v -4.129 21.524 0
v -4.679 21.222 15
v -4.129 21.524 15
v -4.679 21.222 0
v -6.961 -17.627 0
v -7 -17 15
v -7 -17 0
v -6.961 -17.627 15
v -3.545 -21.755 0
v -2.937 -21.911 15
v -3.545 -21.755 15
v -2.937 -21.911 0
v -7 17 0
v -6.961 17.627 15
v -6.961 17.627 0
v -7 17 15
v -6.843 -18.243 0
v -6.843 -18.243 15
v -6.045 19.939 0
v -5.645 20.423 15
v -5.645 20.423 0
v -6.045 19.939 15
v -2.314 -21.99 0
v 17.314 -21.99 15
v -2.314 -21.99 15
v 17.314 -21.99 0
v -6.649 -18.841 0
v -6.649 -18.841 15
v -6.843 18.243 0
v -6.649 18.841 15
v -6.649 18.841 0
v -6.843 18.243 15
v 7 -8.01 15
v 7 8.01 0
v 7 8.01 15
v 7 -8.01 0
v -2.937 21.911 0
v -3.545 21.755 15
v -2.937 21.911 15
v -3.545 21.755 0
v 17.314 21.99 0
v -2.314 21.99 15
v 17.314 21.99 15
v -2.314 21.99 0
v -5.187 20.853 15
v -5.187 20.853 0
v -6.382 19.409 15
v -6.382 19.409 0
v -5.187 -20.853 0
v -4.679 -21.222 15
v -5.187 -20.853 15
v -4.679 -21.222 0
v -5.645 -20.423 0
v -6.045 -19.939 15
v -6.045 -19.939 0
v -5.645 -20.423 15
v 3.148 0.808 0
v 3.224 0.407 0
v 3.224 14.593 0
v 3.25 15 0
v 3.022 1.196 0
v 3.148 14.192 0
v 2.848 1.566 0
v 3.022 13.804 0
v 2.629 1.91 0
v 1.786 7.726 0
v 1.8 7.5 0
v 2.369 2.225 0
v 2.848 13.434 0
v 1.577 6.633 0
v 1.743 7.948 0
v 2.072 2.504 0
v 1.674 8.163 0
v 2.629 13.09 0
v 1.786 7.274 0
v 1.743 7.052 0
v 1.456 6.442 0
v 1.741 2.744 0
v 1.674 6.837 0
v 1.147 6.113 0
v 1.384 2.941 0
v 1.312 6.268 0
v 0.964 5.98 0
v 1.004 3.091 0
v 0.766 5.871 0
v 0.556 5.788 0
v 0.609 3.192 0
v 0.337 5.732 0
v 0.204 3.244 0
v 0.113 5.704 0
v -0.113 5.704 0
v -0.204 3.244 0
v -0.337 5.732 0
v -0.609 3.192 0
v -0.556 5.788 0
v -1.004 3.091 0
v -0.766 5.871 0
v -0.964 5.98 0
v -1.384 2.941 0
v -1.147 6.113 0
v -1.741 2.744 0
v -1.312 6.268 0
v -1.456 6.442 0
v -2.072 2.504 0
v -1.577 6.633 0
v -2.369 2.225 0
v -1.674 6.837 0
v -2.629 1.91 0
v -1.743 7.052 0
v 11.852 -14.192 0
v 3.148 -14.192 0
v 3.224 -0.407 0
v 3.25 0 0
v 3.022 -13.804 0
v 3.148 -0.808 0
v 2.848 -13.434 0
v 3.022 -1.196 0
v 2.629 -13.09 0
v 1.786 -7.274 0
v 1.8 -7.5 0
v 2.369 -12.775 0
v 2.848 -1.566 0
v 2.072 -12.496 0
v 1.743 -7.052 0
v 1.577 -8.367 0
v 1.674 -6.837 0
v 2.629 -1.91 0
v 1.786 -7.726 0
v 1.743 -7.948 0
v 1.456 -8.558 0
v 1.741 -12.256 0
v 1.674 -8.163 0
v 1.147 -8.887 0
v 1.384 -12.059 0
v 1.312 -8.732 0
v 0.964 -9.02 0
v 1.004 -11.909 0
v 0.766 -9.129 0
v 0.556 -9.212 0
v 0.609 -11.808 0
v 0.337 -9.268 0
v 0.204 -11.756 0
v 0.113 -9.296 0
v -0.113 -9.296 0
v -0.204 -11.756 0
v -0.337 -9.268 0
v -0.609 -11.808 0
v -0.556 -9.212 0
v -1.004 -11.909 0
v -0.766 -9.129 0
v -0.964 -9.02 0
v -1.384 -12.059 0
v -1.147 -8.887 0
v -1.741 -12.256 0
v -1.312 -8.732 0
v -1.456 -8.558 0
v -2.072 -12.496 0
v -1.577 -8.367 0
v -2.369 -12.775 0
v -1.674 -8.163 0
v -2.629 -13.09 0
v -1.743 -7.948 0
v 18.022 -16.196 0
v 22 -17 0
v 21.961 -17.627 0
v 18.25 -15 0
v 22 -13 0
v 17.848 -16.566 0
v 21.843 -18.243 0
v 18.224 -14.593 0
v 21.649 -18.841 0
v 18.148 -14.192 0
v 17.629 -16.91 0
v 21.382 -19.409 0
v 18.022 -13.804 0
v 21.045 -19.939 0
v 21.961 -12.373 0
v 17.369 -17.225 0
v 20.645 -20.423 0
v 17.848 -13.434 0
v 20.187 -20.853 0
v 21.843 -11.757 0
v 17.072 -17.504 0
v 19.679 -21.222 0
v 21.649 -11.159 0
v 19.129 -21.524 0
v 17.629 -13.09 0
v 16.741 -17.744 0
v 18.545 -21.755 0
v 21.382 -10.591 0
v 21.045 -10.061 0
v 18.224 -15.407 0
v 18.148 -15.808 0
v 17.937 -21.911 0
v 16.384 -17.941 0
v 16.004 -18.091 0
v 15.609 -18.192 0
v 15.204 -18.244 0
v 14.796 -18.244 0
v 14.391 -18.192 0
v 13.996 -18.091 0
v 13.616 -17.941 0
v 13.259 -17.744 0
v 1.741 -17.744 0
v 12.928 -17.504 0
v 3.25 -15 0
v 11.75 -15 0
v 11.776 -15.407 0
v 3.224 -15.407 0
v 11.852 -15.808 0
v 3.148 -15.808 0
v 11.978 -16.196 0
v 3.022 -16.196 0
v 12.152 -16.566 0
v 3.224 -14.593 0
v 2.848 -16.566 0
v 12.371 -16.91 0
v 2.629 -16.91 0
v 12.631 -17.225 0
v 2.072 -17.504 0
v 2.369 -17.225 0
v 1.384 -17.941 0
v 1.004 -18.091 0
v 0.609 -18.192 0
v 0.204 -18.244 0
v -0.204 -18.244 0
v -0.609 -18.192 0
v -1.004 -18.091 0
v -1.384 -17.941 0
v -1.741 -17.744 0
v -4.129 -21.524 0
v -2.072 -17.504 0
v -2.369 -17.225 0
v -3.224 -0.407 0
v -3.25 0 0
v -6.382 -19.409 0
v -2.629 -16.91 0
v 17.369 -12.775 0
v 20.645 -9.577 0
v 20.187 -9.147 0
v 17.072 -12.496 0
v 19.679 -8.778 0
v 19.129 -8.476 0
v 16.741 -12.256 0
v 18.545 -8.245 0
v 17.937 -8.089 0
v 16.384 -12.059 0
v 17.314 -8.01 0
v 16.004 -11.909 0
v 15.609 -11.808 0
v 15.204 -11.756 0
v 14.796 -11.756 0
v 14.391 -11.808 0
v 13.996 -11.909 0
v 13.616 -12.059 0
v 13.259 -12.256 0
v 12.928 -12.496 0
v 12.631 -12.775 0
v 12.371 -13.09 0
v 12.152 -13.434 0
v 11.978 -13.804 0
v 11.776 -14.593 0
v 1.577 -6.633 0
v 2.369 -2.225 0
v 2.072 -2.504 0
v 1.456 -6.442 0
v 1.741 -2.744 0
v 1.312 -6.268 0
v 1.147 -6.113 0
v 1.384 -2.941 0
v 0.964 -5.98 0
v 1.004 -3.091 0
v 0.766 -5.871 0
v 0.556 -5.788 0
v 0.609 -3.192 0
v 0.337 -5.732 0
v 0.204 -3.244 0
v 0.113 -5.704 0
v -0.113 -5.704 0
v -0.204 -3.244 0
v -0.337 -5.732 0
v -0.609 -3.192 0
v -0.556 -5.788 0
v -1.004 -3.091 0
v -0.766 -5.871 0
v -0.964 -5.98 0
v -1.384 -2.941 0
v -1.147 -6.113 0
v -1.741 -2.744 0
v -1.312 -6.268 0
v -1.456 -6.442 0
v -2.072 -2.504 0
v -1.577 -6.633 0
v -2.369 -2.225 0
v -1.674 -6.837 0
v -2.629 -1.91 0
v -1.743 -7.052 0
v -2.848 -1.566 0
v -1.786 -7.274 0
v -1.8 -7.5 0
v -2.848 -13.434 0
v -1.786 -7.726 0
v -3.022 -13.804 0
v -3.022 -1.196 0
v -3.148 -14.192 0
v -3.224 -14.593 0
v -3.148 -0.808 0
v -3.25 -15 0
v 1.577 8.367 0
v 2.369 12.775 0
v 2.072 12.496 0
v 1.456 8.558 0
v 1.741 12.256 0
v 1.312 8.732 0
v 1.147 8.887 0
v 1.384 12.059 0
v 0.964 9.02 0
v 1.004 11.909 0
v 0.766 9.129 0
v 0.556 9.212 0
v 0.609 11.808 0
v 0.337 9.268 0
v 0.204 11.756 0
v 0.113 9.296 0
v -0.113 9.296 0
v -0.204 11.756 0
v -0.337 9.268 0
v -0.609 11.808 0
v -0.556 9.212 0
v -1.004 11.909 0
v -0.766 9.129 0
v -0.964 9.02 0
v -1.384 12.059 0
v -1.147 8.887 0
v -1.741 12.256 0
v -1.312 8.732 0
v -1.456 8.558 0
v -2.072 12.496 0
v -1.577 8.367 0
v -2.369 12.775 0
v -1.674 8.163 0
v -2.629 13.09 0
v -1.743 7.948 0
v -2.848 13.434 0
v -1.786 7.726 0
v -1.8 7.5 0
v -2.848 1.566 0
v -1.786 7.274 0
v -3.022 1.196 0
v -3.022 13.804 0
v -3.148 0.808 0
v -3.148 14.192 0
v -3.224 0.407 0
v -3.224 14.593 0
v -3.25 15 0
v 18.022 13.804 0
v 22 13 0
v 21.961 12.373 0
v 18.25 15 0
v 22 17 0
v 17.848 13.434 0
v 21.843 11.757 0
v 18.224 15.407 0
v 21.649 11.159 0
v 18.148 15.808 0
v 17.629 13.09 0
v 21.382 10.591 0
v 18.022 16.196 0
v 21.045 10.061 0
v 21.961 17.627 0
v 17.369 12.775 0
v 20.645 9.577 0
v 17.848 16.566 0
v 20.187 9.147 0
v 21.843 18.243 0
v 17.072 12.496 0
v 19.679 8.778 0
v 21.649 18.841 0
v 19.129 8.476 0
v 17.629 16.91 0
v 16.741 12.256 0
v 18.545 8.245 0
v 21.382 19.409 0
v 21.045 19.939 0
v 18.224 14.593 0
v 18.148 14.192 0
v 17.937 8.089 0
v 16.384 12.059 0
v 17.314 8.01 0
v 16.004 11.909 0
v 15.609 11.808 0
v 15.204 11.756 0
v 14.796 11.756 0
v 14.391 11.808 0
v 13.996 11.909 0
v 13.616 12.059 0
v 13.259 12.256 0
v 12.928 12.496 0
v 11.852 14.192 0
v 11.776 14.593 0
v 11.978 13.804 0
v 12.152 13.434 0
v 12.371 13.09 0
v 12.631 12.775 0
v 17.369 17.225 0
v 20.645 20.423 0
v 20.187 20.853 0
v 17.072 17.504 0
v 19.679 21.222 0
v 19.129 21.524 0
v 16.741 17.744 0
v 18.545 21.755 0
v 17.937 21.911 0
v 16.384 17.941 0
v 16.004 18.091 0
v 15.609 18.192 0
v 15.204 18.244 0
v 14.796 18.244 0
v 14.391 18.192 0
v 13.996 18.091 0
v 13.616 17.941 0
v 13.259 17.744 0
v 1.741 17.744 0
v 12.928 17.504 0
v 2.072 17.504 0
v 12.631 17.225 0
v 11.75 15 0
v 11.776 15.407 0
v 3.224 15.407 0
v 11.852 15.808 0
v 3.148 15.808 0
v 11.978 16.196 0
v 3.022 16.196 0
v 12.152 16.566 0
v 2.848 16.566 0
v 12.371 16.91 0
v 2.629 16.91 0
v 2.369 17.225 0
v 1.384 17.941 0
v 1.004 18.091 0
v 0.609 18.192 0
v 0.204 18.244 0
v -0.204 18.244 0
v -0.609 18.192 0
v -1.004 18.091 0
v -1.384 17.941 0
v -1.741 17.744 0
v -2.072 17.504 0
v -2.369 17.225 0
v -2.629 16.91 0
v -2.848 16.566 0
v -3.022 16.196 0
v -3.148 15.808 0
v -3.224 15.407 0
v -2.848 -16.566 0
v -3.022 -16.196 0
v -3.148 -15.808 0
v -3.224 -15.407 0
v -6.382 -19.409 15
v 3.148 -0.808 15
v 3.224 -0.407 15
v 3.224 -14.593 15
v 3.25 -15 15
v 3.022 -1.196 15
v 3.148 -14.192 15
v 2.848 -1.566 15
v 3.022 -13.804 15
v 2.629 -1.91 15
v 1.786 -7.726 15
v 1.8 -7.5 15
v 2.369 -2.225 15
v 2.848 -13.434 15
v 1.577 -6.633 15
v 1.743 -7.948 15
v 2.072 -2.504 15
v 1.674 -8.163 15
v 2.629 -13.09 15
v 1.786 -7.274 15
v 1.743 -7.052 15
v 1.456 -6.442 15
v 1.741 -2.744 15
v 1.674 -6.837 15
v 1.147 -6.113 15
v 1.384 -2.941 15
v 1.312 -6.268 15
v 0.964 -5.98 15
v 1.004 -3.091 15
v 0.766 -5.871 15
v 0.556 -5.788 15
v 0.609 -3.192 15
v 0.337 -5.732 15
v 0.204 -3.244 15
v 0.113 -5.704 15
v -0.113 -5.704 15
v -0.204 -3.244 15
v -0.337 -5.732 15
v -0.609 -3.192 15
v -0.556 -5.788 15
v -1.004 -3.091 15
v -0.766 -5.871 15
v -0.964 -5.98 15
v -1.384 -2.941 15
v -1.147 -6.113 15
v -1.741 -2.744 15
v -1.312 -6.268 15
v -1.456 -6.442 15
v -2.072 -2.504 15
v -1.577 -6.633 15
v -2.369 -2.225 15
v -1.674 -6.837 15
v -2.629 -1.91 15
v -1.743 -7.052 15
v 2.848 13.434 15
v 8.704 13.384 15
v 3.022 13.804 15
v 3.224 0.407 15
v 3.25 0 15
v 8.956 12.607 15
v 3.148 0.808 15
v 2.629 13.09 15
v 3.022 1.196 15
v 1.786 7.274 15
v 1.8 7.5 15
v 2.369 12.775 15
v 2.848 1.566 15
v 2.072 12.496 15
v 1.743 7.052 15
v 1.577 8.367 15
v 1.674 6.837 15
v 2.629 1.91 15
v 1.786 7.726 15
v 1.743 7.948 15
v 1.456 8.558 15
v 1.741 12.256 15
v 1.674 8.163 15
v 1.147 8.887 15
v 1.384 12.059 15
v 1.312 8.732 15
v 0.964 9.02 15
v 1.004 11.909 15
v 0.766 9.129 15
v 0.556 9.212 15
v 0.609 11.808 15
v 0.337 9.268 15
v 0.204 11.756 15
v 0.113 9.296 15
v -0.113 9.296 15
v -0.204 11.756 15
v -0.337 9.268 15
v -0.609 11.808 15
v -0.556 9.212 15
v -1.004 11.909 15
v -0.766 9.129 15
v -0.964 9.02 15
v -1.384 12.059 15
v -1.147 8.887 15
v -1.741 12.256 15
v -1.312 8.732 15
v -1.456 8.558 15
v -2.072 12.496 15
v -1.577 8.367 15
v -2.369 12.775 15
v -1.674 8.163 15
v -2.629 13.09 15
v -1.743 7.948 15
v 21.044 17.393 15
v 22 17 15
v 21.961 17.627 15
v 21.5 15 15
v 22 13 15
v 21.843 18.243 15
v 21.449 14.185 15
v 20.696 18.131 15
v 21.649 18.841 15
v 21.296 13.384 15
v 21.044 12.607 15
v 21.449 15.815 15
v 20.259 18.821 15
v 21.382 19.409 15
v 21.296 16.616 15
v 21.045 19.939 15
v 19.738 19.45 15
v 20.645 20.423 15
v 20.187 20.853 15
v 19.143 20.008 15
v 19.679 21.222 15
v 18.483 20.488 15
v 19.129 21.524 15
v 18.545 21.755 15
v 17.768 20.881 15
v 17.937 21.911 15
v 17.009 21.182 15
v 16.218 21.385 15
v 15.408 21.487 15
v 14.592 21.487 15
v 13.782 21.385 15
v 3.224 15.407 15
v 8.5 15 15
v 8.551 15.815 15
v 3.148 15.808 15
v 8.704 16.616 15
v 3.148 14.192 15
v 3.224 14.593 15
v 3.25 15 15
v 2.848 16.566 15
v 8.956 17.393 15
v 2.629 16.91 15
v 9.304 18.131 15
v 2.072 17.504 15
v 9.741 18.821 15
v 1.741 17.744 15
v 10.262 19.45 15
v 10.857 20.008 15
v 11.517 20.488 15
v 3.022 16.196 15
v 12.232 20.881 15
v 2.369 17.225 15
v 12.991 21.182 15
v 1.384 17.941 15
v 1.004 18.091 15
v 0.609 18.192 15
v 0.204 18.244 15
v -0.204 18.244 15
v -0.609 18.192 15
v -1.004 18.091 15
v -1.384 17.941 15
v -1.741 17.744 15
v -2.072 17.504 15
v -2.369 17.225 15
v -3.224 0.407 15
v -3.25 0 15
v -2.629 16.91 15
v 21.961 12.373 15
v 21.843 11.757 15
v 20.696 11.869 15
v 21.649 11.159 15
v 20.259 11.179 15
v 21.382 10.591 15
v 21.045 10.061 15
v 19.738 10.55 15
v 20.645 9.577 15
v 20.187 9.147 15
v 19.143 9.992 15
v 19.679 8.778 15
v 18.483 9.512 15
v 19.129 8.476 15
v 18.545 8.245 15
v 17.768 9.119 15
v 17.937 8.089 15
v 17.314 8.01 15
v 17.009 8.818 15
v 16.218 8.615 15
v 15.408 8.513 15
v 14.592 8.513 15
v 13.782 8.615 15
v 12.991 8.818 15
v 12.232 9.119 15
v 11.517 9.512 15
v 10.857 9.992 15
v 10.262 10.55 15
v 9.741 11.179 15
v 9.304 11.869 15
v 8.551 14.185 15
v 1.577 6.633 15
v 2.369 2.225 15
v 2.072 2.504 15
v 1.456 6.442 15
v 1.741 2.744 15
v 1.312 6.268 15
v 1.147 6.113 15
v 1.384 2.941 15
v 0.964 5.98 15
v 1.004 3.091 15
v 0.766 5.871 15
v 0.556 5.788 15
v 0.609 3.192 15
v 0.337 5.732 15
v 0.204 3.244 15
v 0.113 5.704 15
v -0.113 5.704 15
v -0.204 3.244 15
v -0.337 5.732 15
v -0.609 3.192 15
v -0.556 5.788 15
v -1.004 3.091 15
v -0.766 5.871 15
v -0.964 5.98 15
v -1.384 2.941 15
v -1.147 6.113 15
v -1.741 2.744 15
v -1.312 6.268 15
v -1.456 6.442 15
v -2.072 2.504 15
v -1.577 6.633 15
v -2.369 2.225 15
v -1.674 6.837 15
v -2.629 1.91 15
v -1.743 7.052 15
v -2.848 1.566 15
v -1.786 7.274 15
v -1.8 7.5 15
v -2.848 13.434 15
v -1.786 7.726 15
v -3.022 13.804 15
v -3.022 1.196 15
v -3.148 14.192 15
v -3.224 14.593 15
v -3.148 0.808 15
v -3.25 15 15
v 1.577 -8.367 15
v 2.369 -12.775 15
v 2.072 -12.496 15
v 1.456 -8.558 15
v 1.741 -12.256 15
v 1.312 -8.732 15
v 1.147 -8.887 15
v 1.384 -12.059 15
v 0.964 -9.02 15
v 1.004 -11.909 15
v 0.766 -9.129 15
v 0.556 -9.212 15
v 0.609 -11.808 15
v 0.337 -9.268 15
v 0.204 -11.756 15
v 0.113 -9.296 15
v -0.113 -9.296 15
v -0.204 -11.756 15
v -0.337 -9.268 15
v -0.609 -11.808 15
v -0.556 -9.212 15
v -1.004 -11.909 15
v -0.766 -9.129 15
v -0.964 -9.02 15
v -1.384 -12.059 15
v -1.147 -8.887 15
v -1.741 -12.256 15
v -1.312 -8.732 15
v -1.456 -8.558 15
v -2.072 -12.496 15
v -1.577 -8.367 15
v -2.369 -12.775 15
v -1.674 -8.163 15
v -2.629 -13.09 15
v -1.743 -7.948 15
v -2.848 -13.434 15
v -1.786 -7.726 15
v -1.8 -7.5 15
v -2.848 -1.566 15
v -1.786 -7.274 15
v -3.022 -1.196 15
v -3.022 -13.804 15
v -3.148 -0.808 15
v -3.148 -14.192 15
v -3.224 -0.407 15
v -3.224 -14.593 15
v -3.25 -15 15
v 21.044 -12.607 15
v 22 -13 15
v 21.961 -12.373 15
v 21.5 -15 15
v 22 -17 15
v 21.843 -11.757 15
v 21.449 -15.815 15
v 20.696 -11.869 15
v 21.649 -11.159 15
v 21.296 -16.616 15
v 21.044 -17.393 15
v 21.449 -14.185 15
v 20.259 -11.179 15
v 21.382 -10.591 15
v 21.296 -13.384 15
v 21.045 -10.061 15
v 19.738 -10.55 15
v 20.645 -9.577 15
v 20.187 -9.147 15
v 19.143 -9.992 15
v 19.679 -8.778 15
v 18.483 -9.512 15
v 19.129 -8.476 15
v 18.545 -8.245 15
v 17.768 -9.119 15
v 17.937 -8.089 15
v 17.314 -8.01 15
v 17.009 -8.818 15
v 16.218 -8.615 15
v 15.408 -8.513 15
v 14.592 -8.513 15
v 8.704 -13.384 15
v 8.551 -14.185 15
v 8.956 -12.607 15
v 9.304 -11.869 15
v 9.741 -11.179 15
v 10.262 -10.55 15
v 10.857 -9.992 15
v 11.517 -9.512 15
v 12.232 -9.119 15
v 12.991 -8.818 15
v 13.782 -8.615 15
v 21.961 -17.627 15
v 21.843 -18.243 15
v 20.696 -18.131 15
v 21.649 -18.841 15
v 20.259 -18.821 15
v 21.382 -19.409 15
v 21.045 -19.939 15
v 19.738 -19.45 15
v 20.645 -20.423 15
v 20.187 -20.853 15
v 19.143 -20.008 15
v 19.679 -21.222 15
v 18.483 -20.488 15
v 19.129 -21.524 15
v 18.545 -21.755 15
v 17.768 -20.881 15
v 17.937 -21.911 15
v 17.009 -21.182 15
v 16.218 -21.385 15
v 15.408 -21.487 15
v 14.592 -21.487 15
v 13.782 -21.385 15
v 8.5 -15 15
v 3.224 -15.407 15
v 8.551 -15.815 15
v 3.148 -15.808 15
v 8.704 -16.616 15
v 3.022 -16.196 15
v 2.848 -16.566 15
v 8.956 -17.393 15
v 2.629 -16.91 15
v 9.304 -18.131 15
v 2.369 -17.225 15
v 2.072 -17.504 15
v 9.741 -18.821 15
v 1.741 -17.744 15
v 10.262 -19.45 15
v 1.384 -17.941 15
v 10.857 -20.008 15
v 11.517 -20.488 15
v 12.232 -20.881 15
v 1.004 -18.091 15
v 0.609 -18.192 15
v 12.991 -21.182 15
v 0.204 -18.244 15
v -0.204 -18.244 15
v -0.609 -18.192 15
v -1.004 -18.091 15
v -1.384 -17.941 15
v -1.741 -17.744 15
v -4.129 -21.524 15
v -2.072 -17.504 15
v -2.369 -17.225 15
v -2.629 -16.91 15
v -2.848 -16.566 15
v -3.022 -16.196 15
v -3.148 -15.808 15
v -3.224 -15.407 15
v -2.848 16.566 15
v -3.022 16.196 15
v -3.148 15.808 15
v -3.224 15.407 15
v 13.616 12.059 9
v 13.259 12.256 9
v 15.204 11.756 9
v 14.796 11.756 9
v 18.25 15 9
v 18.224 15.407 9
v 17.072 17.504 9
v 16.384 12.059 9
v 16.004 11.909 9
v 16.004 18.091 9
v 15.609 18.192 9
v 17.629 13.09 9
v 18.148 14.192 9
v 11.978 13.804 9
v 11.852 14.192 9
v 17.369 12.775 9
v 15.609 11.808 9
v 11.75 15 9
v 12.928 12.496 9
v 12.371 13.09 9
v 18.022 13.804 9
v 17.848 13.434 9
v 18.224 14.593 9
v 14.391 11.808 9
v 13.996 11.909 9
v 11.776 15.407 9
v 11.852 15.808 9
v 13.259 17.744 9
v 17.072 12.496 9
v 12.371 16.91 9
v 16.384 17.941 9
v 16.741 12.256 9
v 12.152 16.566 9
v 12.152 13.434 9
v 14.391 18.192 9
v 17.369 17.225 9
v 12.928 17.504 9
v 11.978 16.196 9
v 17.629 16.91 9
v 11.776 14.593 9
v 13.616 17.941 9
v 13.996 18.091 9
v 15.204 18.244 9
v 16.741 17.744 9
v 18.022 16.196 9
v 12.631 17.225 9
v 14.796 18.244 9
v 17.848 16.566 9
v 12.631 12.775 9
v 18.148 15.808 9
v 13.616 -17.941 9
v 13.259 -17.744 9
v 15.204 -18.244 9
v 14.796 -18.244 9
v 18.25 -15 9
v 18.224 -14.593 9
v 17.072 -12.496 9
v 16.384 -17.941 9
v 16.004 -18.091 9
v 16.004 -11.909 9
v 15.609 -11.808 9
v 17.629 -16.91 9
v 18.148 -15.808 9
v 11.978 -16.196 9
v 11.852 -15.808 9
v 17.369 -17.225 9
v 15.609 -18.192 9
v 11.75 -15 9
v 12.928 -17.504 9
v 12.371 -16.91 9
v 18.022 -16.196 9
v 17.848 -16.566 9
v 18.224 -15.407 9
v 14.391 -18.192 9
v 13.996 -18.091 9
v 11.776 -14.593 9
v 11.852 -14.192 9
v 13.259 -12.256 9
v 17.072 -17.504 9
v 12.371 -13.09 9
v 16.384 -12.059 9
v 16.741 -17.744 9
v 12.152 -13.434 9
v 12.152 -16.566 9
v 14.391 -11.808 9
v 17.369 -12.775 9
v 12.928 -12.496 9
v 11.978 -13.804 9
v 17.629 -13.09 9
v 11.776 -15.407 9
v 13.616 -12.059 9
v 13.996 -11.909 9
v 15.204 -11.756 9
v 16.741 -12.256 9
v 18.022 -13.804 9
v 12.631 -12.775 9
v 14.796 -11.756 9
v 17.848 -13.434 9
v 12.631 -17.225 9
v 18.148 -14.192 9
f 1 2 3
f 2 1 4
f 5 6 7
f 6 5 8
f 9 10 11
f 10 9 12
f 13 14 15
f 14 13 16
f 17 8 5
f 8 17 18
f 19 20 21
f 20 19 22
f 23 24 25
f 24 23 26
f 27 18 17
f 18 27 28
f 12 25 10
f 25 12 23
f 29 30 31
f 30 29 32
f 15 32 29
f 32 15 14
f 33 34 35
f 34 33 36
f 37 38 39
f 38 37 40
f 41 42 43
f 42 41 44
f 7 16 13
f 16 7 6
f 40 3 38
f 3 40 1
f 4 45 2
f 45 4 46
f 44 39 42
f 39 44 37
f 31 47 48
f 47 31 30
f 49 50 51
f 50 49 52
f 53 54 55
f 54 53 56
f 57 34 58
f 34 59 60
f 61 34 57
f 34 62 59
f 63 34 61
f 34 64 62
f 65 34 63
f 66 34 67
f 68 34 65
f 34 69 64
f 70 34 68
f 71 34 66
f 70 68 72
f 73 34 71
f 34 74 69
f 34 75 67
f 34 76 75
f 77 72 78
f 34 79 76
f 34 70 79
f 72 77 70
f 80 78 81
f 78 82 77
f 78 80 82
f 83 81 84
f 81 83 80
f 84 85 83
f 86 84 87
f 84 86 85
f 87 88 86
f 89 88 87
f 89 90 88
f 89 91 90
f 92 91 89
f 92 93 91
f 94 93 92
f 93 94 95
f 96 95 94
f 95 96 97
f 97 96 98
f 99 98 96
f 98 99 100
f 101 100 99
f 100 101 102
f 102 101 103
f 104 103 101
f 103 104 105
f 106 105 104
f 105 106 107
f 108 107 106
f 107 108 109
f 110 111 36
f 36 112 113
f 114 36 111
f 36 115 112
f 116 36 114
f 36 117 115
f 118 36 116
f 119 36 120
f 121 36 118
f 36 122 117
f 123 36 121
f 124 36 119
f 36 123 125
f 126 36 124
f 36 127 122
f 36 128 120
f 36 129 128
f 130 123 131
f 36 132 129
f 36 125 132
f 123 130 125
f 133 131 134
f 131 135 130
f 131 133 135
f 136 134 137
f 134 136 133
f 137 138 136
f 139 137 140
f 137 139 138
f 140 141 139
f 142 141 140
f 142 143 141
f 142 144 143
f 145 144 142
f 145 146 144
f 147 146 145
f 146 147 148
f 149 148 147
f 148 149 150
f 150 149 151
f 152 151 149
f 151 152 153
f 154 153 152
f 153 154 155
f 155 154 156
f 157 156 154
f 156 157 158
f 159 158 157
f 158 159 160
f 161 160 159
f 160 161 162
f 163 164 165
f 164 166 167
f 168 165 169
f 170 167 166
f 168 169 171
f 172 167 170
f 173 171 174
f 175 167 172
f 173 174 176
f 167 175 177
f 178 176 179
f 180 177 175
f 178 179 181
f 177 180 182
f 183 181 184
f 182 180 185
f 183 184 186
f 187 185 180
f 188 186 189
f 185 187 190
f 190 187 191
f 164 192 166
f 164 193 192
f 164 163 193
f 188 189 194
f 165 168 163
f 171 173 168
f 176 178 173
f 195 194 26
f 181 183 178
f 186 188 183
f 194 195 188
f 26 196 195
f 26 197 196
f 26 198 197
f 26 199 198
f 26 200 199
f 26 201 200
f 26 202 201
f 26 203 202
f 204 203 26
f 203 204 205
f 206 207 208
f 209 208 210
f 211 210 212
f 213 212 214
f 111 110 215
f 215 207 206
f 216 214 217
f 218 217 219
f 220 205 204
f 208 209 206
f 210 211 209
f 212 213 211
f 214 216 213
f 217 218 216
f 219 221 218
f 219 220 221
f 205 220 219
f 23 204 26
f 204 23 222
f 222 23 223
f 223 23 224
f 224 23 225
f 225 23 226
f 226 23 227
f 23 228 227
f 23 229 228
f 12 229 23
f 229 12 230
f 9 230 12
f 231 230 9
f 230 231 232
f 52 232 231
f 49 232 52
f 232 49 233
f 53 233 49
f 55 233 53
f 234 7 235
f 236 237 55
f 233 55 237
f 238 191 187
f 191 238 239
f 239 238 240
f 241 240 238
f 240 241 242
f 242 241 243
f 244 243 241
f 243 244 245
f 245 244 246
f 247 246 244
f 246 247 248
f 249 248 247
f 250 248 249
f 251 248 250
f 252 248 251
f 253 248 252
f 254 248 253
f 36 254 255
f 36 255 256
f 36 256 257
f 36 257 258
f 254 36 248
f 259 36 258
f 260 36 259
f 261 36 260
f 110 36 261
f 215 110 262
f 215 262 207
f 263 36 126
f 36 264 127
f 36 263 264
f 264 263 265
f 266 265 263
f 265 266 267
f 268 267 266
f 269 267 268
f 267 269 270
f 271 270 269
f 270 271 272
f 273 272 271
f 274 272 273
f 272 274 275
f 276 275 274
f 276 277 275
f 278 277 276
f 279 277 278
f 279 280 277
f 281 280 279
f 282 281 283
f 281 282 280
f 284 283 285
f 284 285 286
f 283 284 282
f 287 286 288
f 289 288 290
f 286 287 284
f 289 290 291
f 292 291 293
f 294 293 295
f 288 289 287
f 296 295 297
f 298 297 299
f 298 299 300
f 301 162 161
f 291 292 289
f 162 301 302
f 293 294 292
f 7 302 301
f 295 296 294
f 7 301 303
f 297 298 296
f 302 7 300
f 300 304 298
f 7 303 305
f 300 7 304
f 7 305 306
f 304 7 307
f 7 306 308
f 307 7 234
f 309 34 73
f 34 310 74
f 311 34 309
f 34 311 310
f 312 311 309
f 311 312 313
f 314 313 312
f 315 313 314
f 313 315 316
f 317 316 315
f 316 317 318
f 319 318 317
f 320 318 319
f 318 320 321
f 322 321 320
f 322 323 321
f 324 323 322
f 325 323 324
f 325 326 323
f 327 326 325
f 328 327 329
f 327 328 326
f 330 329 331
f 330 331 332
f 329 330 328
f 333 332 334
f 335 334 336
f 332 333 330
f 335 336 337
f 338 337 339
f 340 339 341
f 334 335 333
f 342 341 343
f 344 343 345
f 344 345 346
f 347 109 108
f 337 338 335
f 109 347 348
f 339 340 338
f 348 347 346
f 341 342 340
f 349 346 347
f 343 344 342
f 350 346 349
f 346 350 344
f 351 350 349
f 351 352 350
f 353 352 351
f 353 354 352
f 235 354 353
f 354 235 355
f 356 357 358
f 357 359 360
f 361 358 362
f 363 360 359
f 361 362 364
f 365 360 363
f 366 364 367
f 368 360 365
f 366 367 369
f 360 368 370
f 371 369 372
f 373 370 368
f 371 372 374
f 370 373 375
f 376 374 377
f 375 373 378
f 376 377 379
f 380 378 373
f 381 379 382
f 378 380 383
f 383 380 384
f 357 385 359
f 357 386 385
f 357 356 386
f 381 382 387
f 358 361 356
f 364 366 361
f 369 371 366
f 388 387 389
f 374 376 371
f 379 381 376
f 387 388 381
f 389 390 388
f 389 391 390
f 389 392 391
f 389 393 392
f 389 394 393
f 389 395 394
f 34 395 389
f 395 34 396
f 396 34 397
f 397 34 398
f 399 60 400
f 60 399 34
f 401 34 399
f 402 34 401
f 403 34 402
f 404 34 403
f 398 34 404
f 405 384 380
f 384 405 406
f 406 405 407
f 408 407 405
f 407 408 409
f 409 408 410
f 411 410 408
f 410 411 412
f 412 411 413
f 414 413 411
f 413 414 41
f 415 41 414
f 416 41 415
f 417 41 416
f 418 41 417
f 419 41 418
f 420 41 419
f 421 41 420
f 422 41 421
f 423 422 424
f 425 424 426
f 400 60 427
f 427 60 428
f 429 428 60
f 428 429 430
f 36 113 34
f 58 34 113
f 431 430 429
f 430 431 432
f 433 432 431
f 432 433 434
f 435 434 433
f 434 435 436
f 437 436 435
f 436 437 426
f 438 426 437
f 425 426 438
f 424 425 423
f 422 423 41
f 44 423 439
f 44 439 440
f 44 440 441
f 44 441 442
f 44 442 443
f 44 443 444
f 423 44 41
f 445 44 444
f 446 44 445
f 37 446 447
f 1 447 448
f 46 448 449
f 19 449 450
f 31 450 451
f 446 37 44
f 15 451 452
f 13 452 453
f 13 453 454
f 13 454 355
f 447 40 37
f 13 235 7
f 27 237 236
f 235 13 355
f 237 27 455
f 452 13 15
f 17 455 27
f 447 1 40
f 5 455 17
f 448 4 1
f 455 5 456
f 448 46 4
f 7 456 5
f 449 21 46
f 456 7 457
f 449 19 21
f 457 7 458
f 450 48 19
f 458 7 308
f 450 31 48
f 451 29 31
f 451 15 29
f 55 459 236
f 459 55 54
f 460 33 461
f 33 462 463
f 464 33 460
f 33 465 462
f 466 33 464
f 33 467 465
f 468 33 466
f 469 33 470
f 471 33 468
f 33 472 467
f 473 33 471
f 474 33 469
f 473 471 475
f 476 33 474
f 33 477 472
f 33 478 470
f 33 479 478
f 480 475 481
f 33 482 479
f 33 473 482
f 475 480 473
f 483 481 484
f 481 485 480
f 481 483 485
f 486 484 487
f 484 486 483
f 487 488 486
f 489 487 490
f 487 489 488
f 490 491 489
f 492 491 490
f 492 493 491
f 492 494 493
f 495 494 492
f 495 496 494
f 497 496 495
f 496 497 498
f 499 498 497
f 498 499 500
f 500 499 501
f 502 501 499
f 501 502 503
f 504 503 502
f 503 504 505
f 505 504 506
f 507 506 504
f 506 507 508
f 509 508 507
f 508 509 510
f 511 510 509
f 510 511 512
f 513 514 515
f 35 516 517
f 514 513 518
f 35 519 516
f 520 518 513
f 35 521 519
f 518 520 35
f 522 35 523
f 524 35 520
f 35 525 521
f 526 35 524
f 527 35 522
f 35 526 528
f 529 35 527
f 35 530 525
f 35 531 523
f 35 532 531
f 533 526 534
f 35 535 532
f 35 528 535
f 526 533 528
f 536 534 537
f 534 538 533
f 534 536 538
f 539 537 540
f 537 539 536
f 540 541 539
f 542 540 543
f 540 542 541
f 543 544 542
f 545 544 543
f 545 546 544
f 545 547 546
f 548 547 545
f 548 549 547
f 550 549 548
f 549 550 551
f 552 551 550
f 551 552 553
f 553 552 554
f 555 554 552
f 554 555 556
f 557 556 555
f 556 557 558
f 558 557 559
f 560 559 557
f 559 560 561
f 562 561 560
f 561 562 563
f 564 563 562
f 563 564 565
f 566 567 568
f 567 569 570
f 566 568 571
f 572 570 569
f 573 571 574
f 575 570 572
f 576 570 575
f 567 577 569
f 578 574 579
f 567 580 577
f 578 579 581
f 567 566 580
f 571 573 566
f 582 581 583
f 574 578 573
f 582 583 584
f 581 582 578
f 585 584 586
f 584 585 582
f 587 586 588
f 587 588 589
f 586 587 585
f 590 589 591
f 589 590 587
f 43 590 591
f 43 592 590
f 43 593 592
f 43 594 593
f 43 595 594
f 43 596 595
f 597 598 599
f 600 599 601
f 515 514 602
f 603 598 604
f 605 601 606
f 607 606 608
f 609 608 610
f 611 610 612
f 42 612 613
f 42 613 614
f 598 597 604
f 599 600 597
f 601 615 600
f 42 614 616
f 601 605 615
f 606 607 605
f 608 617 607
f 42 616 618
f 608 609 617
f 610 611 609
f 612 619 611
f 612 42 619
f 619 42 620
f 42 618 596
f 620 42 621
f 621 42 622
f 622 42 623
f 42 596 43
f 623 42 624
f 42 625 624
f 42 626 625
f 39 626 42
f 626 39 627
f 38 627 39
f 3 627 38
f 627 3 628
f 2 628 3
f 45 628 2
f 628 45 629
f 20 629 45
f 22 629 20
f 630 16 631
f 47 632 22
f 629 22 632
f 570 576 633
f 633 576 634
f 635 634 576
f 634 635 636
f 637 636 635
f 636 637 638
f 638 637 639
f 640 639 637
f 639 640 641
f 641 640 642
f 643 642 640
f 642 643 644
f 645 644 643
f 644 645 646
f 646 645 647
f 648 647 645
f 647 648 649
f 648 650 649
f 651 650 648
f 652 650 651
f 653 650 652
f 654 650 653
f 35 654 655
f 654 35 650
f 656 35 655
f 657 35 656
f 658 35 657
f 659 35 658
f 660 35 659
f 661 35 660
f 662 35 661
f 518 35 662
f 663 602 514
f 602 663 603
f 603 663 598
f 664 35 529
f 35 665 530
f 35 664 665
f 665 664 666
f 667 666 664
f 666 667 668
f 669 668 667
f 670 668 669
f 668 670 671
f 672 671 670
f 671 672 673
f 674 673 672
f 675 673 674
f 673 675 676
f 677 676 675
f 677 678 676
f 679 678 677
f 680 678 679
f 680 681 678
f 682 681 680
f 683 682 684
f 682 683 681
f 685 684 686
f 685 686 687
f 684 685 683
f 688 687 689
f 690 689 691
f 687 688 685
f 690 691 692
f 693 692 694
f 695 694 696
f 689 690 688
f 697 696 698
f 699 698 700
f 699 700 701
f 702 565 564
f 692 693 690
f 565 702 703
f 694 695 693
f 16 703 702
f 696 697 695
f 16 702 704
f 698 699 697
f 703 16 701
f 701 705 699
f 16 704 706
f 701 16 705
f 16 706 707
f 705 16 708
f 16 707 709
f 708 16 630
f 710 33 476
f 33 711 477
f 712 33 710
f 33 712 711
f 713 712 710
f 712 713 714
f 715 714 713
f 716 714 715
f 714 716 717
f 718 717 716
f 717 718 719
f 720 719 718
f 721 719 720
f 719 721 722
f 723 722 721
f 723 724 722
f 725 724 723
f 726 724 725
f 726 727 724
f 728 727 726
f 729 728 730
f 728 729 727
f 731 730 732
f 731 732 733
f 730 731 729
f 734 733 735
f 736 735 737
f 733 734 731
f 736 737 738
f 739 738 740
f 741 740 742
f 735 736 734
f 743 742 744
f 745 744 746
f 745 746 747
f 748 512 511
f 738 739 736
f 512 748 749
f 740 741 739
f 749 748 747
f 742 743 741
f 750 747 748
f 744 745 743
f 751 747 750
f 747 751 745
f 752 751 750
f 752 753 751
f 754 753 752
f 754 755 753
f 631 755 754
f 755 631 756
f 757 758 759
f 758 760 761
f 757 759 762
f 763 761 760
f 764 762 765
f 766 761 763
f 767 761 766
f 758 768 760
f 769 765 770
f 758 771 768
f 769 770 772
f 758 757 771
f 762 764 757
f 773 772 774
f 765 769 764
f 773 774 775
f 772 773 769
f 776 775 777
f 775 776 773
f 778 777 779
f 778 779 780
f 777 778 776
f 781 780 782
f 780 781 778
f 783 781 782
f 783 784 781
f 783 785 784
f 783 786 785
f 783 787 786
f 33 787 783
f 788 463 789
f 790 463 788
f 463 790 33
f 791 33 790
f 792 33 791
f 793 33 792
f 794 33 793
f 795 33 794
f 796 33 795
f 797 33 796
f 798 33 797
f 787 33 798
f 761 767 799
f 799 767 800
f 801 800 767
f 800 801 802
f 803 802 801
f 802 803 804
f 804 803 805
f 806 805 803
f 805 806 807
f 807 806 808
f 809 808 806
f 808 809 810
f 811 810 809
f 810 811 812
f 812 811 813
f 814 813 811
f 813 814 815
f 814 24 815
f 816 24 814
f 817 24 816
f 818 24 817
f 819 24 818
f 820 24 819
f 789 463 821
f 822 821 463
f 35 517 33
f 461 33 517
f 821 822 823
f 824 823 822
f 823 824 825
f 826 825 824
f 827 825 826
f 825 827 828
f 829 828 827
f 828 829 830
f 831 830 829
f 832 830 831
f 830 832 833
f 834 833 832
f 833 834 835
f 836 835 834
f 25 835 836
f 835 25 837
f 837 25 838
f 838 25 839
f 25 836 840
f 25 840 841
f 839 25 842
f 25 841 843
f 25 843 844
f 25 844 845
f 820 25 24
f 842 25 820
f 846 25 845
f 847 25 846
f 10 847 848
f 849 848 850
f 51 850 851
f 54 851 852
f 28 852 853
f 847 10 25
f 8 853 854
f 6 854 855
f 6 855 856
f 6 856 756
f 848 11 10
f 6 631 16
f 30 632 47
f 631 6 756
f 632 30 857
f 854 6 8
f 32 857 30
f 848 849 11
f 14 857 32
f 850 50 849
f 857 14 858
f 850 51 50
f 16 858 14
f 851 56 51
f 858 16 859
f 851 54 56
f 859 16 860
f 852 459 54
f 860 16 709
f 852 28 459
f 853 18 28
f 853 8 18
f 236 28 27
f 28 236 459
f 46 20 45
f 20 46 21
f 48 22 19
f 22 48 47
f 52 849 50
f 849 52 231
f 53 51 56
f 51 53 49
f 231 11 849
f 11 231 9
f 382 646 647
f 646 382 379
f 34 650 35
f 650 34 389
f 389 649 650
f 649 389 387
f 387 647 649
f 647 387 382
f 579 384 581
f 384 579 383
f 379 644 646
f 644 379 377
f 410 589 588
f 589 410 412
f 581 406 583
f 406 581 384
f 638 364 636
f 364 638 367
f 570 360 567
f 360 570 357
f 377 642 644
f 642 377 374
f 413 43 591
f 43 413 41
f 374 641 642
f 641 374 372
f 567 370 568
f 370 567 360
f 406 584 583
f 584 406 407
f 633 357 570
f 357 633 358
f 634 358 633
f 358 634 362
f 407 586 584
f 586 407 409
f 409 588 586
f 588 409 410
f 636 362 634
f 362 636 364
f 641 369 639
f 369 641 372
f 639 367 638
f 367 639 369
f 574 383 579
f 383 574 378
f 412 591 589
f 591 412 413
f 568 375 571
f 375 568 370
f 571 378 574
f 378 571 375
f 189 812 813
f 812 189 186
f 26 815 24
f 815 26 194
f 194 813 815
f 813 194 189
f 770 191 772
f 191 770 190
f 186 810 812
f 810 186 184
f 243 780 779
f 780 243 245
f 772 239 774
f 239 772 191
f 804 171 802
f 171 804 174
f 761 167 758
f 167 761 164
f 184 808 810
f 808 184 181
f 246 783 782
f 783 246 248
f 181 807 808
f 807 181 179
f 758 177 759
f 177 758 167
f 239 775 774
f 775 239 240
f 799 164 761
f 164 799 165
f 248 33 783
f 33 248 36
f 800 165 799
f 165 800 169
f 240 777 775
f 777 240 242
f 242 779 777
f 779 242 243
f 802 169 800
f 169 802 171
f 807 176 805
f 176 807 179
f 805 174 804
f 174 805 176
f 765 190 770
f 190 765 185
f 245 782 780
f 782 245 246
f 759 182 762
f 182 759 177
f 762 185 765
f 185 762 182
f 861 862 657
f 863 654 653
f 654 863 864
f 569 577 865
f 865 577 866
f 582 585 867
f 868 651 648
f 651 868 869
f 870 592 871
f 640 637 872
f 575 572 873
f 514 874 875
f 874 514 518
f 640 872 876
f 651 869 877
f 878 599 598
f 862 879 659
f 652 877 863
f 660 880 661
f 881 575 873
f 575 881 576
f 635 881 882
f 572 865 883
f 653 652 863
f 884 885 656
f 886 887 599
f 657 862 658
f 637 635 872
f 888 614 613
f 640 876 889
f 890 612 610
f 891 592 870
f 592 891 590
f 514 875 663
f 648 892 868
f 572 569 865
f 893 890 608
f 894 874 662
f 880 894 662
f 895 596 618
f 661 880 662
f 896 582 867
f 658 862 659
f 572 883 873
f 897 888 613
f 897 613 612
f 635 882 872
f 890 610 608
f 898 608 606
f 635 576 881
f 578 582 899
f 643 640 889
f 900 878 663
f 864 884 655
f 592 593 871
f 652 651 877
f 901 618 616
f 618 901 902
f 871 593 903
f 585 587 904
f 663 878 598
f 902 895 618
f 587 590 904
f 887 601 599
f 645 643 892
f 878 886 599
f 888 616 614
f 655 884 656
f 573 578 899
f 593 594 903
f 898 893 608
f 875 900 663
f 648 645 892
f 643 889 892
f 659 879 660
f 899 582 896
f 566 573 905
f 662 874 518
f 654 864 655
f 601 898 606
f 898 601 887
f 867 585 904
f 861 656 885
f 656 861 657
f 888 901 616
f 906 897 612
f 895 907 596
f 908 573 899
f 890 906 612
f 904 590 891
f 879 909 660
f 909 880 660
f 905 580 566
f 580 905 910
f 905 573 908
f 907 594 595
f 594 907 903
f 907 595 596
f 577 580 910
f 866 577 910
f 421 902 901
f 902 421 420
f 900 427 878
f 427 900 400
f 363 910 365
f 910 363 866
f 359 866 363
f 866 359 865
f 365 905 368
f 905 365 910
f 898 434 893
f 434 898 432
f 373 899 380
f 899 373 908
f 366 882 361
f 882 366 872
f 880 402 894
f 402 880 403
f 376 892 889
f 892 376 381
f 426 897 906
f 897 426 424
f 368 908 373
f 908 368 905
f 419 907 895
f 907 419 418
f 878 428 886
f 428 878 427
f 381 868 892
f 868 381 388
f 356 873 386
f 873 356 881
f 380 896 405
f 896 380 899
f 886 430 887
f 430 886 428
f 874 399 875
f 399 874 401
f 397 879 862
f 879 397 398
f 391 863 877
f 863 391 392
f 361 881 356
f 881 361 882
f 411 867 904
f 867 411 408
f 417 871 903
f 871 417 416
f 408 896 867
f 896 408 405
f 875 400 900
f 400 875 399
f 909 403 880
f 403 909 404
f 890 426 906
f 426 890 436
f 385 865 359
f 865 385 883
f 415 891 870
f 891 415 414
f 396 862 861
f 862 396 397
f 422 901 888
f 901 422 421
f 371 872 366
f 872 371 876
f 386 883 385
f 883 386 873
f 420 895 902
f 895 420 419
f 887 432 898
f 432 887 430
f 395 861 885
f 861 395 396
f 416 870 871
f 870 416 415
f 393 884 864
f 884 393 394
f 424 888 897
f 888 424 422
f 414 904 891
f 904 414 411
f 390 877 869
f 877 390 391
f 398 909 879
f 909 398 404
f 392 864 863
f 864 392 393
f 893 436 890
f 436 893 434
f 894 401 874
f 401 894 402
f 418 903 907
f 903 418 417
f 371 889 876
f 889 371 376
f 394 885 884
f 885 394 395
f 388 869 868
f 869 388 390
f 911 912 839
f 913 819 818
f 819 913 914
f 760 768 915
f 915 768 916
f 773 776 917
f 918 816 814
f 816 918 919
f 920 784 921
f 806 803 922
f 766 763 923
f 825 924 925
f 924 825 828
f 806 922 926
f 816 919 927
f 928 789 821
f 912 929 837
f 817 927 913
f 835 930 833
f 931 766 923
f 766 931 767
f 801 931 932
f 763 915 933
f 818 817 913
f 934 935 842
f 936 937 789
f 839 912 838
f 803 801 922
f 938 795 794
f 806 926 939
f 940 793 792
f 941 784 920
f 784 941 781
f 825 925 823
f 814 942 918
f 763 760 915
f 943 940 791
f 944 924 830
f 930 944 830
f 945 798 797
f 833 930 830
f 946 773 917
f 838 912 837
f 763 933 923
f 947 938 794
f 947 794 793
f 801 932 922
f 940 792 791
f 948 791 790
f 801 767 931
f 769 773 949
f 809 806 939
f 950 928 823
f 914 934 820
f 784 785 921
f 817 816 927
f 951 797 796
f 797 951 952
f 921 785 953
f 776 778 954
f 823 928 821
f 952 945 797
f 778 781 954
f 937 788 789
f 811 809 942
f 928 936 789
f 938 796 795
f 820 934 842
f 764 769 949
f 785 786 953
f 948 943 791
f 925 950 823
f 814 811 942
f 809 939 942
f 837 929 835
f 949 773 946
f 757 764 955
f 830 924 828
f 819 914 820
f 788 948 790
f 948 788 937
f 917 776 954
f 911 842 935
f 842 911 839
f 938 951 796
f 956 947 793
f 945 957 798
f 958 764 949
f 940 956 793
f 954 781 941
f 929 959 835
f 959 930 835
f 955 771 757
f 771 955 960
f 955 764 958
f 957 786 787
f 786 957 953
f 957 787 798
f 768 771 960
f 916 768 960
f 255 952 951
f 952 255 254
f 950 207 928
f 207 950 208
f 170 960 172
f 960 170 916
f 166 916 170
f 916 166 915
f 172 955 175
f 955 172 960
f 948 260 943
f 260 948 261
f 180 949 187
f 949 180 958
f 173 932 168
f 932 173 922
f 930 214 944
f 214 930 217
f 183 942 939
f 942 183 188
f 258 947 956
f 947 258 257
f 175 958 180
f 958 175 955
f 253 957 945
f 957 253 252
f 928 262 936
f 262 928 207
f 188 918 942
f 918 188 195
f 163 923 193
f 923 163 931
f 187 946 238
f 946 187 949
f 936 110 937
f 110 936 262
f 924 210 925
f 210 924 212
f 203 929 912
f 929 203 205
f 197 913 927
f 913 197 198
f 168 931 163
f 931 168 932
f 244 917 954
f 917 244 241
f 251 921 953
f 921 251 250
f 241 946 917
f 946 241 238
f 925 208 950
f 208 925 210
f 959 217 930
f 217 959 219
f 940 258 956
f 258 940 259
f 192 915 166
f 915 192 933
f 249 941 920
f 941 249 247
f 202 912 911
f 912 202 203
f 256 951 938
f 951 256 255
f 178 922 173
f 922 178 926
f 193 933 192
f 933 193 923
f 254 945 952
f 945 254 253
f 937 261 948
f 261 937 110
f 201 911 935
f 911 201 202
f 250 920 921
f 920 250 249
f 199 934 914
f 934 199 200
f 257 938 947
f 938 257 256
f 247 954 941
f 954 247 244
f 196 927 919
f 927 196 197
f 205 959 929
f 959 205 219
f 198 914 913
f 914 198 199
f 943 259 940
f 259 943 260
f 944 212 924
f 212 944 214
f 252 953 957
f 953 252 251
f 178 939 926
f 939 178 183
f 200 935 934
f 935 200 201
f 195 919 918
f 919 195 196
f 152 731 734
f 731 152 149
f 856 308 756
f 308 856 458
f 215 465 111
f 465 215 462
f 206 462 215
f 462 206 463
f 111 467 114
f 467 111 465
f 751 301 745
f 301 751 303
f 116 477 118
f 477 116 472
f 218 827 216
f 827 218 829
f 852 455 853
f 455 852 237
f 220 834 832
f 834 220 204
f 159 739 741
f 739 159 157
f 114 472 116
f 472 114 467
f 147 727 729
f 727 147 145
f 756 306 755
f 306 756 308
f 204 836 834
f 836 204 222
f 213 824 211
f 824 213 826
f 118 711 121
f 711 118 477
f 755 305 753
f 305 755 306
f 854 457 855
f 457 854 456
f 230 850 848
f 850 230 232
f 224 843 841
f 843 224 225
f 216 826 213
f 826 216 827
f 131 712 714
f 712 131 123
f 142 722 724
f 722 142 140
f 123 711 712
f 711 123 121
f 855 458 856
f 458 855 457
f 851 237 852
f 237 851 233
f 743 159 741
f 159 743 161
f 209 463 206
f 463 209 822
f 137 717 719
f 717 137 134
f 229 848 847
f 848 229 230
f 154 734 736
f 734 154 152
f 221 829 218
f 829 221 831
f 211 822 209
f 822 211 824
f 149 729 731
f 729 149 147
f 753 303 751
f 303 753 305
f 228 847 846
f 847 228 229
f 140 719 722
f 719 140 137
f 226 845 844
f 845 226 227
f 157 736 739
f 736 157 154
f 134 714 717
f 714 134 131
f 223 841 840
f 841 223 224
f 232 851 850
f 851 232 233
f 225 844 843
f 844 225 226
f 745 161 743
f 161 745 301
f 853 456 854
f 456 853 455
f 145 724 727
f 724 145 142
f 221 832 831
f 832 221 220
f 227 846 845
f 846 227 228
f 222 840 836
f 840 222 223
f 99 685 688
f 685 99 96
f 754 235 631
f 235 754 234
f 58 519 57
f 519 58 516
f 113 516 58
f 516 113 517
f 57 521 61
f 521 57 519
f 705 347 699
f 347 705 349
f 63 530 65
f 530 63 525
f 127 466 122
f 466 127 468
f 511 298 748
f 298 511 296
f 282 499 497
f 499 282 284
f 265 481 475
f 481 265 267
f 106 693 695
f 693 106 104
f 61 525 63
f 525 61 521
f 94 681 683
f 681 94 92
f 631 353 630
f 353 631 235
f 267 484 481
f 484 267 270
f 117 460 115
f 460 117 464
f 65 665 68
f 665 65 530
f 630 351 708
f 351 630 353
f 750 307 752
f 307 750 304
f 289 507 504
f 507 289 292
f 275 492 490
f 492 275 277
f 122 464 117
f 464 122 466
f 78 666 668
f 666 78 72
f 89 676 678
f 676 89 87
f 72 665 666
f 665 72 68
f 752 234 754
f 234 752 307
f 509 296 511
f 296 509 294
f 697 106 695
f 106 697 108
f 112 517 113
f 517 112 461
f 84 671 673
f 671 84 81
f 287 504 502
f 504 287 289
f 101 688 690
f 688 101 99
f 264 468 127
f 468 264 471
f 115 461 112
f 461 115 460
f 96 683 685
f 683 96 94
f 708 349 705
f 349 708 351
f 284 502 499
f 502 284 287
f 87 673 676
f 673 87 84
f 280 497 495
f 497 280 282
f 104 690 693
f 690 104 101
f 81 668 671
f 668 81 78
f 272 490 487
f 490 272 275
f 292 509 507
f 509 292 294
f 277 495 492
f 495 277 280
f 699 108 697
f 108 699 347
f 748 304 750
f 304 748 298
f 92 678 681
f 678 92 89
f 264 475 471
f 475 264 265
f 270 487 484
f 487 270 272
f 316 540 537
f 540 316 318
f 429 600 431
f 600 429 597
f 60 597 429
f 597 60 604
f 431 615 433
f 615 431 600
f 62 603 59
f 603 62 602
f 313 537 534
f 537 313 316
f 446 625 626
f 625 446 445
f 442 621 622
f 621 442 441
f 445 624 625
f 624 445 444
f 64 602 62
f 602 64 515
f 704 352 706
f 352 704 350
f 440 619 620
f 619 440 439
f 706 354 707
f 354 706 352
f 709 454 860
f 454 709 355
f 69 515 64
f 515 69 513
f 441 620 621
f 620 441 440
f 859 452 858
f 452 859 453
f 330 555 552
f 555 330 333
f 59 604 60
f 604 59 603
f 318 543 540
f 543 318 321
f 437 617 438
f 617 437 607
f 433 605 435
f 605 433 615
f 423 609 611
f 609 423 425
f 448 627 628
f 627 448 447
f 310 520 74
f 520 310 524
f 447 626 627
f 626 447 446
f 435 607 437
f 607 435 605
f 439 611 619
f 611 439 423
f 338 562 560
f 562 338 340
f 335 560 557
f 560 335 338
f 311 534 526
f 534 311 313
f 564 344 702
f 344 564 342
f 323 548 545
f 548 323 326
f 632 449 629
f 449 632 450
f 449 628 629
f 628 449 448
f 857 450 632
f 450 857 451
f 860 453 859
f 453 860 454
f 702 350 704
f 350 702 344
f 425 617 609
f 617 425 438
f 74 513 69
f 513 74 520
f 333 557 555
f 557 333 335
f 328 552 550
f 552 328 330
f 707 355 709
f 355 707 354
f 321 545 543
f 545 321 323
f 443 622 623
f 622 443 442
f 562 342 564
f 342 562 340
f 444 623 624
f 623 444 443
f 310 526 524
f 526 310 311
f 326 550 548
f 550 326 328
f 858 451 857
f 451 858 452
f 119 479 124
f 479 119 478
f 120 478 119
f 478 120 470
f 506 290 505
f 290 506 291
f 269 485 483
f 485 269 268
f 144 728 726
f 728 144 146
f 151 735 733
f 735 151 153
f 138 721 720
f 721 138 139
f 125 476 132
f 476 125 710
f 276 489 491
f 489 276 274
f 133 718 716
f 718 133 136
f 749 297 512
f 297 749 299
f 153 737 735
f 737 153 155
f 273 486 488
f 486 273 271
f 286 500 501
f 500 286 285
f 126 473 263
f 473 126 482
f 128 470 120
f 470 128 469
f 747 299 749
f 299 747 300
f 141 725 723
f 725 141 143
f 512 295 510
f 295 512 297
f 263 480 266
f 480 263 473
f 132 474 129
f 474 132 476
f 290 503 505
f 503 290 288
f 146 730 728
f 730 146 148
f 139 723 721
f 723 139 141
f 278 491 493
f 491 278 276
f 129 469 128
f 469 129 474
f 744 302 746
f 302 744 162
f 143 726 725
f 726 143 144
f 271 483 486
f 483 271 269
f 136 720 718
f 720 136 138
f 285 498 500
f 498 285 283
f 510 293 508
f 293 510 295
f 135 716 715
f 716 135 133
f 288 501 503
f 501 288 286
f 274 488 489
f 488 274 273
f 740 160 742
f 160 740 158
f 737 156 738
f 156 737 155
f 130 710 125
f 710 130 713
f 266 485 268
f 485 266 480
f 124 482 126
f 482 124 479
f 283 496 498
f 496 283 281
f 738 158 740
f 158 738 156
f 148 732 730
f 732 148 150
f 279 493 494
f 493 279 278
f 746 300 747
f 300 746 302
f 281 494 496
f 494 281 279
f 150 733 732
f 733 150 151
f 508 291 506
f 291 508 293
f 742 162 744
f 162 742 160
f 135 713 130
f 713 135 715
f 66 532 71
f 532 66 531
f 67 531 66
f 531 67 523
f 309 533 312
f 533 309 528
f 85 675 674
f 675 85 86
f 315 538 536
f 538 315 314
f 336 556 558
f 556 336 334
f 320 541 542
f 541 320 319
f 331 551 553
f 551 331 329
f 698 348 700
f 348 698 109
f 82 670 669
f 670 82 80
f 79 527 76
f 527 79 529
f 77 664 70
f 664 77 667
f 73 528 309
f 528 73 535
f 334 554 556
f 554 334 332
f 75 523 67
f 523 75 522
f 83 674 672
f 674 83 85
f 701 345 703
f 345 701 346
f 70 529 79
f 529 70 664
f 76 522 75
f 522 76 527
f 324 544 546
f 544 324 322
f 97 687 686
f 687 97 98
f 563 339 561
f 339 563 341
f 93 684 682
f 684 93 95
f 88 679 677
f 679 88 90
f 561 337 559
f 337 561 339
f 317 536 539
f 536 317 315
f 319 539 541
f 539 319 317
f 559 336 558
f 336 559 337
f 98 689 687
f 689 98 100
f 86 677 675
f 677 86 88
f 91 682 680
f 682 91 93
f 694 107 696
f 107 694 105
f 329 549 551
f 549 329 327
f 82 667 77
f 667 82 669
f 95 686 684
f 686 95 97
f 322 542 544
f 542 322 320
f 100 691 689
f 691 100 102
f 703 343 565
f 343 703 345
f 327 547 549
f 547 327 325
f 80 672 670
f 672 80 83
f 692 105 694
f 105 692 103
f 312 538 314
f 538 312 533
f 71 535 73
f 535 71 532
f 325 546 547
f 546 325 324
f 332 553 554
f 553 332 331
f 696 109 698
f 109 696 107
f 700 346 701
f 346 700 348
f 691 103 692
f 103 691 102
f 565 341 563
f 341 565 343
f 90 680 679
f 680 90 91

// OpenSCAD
$fn = 50;


difference() {
	union() {
		hull() {
			translate(v = [-2.0000000000, 17.0000000000, 0]) {
				cylinder(h = 15, r = 5);
			}
			translate(v = [2.0000000000, 17.0000000000, 0]) {
				cylinder(h = 15, r = 5);
			}
			translate(v = [-2.0000000000, -17.0000000000, 0]) {
				cylinder(h = 15, r = 5);
			}
			translate(v = [2.0000000000, -17.0000000000, 0]) {
				cylinder(h = 15, r = 5);
			}
		}
		translate(v = [7.5000000000, 15.0000000000, 0]) {
			hull() {
				translate(v = [-9.5000000000, 2.0000000000, 0]) {
					cylinder(h = 15, r = 5);
				}
				translate(v = [9.5000000000, 2.0000000000, 0]) {
					cylinder(h = 15, r = 5);
				}
				translate(v = [-9.5000000000, -2.0000000000, 0]) {
					cylinder(h = 15, r = 5);
				}
				translate(v = [9.5000000000, -2.0000000000, 0]) {
					cylinder(h = 15, r = 5);
				}
			}
		}
		translate(v = [7.5000000000, -15.0000000000, 0]) {
			hull() {
				translate(v = [-9.5000000000, 2.0000000000, 0]) {
					cylinder(h = 15, r = 5);
				}
				translate(v = [9.5000000000, 2.0000000000, 0]) {
					cylinder(h = 15, r = 5);
				}
				translate(v = [-9.5000000000, -2.0000000000, 0]) {
					cylinder(h = 15, r = 5);
				}
				translate(v = [9.5000000000, -2.0000000000, 0]) {
					cylinder(h = 15, r = 5);
				}
			}
		}
	}
	union() {
		translate(v = [15.0000000000, 15.0000000000, 15]) {
			rotate(a = [0, 0, 0]) {
				difference() {
					union() {
						#translate(v = [0, 0, -15.0000000000]) {
							cylinder(h = 15, r = 2.2500000000);
						}
						#translate(v = [0, 0, -6]) {
							cylinder(h = 6, r1 = 3.2500000000, r2 = 6.5000000000);
						}
						#translate(v = [0, 0, -15.0000000000]) {
							cylinder(h = 15, r = 3.2500000000);
						}
						#translate(v = [0, 0, -15.0000000000]) {
							cylinder(h = 15, r = 2.2500000000);
						}
					}
					union();
				}
			}
		}
		translate(v = [15.0000000000, -15.0000000000, 15]) {
			rotate(a = [0, 0, 0]) {
				difference() {
					union() {
						#translate(v = [0, 0, -15.0000000000]) {
							cylinder(h = 15, r = 2.2500000000);
						}
						#translate(v = [0, 0, -6]) {
							cylinder(h = 6, r1 = 3.2500000000, r2 = 6.5000000000);
						}
						#translate(v = [0, 0, -15.0000000000]) {
							cylinder(h = 15, r = 3.2500000000);
						}
						#translate(v = [0, 0, -15.0000000000]) {
							cylinder(h = 15, r = 2.2500000000);
						}
					}
					union();
				}
			}
		}
		translate(v = [0.0000000000, -15.0000000000, 0]) {
			translate(v = [0, 0, -100]) {
				cylinder(h = 200, r = 3.2500000000);
			}
		}
		translate(v = [0, 0, -100]) {
			cylinder(h = 200, r = 3.2500000000);
		}
		translate(v = [0.0000000000, 15.0000000000, 0]) {
			translate(v = [0, 0, -100]) {
				cylinder(h = 200, r = 3.2500000000);
			}
		}
		translate(v = [0.0000000000, -15.0000000000, 0]) {
			translate(v = [0, 0, -100]) {
				cylinder(h = 200, r = 1.8000000000);
			}
		}
		translate(v = [0.0000000000, -7.5000000000, 0]) {
			translate(v = [0, 0, -100]) {
				cylinder(h = 200, r = 1.8000000000);
			}
		}
		translate(v = [0, 0, -100]) {
			cylinder(h = 200, r = 1.8000000000);
		}
		translate(v = [0.0000000000, 7.5000000000, 0]) {
			translate(v = [0, 0, -100]) {
				cylinder(h = 200, r = 1.8000000000);
			}
		}
		translate(v = [0.0000000000, 15.0000000000, 0]) {
			translate(v = [0, 0, -100]) {
				cylinder(h = 200, r = 1.8000000000);
			}
		}
	}
}
